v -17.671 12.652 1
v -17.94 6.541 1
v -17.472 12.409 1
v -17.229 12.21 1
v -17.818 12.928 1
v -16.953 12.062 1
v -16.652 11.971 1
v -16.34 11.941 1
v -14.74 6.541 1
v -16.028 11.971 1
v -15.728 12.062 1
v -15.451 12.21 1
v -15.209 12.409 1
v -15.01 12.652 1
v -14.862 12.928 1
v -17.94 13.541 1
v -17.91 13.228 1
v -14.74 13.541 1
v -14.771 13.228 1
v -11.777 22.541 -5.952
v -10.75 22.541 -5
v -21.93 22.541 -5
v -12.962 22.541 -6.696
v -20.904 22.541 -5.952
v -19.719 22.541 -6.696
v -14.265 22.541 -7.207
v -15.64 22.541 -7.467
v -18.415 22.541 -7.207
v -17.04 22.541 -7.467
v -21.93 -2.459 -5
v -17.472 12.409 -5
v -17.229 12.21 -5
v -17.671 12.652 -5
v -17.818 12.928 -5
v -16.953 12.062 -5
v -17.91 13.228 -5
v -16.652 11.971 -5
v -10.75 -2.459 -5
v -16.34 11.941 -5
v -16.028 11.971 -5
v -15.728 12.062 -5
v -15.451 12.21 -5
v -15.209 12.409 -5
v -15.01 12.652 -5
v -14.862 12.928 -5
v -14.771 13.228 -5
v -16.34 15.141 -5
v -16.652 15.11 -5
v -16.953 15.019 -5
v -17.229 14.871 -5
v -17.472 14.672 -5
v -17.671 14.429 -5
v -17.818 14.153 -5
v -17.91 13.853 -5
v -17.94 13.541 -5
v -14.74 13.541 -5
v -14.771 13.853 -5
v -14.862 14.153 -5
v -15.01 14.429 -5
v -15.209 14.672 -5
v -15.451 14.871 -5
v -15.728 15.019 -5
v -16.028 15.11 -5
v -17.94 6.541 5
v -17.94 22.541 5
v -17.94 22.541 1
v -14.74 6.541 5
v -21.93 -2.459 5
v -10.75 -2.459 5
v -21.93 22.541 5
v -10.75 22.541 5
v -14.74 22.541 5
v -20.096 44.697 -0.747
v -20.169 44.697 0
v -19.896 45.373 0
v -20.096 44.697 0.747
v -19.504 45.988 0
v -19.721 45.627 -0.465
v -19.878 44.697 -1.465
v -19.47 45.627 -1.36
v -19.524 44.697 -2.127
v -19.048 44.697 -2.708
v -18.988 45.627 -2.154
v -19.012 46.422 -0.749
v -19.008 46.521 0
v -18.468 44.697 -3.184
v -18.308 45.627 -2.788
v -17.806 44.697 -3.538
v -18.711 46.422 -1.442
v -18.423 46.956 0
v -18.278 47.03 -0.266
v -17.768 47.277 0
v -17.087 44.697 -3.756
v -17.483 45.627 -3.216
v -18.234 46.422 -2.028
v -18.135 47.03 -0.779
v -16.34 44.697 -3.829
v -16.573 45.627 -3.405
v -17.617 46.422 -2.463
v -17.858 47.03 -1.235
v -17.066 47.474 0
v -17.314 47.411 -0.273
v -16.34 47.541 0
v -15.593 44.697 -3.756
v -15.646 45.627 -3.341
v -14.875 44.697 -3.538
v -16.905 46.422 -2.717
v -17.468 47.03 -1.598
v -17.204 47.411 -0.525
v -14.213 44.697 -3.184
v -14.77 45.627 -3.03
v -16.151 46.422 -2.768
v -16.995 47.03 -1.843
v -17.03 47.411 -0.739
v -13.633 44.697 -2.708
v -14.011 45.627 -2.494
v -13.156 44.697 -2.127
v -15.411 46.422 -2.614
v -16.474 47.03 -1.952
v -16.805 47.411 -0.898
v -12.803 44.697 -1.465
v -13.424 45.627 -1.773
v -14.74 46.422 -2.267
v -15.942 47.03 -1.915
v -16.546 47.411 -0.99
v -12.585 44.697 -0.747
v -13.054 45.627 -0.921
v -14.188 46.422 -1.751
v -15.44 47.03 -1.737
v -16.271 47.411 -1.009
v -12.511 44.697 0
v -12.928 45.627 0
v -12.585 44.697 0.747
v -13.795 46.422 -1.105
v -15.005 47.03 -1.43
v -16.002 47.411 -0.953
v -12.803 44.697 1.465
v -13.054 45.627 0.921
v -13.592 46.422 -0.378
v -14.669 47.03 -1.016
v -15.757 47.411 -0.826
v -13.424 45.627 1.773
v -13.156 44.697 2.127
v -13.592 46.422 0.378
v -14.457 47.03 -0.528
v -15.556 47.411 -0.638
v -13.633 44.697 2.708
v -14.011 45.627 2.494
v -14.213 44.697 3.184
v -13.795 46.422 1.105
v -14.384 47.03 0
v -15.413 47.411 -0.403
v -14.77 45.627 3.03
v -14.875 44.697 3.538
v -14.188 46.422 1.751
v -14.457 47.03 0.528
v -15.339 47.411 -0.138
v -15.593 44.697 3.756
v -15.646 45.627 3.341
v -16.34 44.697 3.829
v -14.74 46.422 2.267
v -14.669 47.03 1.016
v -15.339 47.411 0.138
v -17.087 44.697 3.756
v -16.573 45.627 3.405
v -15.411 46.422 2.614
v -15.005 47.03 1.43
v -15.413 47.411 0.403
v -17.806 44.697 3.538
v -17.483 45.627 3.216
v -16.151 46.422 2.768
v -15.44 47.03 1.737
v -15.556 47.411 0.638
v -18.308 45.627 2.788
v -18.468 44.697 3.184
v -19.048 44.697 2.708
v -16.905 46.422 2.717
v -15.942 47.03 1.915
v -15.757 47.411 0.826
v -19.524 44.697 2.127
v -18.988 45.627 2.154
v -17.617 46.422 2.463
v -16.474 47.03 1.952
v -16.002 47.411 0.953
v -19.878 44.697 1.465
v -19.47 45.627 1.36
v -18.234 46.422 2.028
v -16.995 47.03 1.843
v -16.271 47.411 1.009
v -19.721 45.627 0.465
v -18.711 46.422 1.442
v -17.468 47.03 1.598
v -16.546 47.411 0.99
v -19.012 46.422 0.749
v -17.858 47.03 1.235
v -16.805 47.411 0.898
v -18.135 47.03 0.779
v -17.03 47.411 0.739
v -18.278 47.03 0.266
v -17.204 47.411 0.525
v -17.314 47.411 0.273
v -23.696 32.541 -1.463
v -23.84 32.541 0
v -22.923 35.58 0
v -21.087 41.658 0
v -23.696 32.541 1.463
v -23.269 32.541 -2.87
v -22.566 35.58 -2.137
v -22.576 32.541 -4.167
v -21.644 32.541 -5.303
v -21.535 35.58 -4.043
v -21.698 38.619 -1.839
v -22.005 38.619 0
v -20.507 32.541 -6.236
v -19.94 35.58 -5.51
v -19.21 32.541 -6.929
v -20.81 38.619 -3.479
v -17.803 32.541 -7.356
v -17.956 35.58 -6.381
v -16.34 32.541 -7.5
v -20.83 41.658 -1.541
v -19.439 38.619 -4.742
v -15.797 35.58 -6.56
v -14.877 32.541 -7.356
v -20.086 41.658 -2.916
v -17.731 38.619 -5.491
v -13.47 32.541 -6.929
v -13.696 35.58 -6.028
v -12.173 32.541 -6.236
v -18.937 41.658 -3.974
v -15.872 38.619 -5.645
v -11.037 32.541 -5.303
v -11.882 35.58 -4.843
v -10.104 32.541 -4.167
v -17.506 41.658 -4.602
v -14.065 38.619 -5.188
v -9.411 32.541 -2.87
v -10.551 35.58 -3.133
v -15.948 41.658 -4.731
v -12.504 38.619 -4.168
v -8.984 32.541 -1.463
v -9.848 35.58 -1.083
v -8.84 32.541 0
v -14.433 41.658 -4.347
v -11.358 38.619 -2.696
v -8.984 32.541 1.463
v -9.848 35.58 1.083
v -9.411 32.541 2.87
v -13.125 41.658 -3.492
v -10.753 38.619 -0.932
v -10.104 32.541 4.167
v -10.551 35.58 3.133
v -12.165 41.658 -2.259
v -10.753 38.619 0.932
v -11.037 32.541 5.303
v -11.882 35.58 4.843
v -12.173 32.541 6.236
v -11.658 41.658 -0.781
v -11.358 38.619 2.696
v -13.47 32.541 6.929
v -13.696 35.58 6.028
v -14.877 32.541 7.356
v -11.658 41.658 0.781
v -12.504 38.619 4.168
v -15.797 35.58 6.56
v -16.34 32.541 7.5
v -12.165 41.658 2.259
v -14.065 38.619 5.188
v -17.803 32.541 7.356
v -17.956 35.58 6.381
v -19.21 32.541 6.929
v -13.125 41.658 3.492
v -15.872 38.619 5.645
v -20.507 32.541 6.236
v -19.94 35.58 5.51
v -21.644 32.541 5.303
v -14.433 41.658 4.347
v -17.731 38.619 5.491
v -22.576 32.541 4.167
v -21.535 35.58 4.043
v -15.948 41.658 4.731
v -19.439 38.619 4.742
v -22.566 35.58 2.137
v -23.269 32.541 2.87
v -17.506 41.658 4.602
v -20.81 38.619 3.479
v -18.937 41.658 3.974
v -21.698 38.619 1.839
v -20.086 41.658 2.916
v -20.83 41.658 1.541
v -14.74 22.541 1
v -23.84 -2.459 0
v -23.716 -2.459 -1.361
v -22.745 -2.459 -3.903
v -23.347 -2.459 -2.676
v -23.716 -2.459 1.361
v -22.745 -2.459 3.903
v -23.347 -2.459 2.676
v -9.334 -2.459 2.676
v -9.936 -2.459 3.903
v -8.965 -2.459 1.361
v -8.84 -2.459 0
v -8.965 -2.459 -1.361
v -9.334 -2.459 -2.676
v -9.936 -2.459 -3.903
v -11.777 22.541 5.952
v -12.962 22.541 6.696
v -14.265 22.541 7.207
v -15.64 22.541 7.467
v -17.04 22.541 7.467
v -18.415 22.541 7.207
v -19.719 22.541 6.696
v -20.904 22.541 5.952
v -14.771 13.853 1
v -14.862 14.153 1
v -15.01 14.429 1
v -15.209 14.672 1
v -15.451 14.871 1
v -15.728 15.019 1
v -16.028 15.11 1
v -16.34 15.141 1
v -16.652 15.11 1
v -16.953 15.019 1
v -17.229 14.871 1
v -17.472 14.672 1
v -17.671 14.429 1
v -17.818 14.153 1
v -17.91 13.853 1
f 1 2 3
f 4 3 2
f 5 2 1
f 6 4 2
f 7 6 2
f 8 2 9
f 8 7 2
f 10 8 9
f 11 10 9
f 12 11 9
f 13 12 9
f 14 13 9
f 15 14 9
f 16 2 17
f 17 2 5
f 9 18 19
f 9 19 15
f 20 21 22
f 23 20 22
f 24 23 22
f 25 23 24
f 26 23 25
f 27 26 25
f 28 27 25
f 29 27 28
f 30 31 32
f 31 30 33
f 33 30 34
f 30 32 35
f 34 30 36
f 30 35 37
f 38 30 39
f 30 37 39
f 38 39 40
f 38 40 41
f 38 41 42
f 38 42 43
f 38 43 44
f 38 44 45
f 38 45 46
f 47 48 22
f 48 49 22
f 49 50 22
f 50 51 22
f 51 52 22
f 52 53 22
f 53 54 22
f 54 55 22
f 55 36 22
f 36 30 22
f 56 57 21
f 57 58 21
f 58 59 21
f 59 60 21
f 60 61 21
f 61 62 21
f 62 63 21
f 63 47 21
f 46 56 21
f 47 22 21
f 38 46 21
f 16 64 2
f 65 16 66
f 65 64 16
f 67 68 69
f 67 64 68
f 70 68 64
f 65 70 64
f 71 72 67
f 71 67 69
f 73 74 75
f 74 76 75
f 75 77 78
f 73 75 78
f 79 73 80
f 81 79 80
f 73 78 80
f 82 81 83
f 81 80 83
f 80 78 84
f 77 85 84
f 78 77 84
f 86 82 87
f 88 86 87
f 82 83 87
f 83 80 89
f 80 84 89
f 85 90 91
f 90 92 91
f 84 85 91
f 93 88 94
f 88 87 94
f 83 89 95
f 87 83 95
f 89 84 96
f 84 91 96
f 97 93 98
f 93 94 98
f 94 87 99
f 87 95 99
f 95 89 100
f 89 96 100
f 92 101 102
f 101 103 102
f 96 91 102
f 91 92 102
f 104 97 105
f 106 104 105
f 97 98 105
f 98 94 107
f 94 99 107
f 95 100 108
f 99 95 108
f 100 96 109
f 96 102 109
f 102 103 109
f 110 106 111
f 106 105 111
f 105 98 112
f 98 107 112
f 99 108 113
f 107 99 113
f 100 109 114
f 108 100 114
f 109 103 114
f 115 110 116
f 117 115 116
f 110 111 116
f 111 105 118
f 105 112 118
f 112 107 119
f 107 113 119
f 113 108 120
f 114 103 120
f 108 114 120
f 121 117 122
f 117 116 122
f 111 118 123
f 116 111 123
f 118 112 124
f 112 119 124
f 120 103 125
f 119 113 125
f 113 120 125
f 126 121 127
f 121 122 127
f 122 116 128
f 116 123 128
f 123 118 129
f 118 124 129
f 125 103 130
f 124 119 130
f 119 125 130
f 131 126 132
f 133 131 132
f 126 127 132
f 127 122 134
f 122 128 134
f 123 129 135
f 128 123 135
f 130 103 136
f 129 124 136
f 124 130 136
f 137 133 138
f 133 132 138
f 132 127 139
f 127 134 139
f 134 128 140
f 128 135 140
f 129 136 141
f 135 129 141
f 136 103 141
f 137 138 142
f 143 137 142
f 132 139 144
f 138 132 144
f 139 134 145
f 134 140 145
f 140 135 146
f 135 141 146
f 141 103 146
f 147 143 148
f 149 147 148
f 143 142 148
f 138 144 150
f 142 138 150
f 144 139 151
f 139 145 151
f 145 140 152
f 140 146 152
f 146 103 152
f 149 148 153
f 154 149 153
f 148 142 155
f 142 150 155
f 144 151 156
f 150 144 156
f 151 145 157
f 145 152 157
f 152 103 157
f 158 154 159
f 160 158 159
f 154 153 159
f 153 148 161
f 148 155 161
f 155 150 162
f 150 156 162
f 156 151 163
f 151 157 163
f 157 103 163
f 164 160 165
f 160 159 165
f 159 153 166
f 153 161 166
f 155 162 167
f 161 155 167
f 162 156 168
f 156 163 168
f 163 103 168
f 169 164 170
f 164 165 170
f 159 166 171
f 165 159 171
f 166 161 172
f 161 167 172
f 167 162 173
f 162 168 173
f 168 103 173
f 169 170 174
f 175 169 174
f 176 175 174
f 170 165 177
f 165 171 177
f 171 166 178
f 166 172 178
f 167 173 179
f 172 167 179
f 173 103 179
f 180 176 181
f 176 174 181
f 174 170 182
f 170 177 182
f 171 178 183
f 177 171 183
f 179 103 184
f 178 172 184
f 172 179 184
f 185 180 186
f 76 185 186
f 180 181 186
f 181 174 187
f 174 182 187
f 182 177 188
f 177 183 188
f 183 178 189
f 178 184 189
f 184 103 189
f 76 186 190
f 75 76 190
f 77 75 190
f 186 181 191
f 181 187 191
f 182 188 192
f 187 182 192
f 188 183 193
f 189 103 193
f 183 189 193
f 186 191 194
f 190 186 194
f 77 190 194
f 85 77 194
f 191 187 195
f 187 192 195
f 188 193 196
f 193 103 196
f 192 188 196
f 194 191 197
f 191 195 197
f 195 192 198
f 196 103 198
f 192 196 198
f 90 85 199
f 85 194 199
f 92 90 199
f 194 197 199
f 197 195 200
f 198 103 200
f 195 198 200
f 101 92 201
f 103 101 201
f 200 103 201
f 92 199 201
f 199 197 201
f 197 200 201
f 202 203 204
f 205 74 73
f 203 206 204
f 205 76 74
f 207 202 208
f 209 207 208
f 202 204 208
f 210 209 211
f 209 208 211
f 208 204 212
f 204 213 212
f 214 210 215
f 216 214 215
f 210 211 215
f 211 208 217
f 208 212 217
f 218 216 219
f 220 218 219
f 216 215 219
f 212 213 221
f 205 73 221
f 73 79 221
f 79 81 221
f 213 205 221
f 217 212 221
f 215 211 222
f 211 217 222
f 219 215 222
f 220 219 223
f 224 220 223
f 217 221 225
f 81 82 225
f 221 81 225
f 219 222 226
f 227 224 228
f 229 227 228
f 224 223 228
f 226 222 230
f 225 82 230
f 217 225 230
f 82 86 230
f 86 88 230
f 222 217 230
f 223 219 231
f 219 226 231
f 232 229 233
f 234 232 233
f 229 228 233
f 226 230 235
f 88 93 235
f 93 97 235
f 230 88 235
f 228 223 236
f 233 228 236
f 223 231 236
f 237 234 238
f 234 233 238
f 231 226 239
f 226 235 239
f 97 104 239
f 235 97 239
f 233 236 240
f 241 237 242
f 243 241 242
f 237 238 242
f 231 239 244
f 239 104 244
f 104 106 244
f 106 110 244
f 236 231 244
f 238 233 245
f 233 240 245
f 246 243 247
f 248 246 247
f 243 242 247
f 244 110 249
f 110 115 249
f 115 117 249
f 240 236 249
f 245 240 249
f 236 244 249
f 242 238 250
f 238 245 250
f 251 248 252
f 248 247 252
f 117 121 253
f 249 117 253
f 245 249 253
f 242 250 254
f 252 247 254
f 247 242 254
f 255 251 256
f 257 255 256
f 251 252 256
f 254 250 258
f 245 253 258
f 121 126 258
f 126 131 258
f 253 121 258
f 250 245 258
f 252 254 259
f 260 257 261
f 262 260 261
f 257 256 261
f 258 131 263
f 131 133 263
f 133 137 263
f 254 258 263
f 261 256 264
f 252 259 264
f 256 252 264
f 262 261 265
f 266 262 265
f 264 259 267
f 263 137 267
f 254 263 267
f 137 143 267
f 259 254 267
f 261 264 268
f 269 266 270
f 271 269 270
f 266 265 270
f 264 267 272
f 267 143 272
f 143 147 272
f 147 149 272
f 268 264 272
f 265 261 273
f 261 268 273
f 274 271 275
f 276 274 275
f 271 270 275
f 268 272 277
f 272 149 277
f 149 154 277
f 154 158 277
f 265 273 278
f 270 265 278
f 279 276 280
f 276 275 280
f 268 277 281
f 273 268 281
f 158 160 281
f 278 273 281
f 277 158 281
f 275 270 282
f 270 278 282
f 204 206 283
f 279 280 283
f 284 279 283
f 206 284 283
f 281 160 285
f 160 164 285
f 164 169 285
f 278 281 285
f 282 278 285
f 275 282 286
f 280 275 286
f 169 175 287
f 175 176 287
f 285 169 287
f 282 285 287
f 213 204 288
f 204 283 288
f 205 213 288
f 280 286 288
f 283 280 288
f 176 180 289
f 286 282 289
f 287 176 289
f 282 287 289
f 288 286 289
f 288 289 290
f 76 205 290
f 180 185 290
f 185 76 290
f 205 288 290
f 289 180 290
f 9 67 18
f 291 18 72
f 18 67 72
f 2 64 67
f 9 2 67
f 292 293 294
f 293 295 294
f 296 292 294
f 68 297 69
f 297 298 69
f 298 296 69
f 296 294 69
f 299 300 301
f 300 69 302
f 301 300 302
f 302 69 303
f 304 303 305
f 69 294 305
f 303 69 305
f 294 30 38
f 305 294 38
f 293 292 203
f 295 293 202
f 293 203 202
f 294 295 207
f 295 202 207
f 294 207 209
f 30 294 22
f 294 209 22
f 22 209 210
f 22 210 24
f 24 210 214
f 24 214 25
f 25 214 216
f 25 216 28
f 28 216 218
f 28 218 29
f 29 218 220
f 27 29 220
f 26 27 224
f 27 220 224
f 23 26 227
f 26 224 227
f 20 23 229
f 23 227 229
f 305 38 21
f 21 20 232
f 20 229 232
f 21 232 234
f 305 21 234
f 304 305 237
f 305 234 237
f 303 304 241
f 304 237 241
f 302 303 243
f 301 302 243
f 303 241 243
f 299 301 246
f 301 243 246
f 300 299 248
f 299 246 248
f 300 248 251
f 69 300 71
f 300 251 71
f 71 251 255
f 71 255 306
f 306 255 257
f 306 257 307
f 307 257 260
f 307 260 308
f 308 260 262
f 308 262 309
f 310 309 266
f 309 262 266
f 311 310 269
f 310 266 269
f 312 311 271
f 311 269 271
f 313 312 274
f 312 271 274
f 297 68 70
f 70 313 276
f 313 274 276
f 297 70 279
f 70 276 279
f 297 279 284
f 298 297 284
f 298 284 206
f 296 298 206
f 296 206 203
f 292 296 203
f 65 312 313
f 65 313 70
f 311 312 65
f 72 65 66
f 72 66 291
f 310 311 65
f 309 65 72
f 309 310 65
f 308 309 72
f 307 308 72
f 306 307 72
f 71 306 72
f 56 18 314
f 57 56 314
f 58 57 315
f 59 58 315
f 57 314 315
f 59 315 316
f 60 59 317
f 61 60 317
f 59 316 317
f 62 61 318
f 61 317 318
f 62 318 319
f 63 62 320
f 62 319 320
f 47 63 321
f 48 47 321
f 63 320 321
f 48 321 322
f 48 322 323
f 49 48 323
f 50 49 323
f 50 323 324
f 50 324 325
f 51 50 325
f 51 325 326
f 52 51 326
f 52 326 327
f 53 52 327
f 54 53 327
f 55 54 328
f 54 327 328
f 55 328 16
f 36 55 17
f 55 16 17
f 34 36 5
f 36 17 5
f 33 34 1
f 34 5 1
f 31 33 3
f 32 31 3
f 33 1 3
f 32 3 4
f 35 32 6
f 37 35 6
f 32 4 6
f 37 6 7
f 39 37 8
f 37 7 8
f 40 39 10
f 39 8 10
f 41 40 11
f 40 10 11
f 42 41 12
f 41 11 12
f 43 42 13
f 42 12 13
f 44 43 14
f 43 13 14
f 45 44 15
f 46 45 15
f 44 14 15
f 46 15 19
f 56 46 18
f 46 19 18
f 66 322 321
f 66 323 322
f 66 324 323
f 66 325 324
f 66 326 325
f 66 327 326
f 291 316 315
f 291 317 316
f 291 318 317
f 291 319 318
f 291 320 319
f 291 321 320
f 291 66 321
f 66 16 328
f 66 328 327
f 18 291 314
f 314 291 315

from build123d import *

# Parameters (mm, degrees)
CUT_EXTRUDE_START   = -25
CUT_EXTRUDE_1_DEPTH = 25
SKETCH_3_W          = 3.2
SKETCH_3_H          = 16
CUT_EXTRUDE_2_DEPTH = 4
SKETCH_4_R          = 1.6
CUT_EXTRUDE_3_DEPTH = 10


with BuildPart() as part:
    # 草图1 → 旋转1 (revolve)
    with BuildSketch(Plane.XY, mode=Mode.PRIVATE) as revolve_1_sk:
        with BuildLine():
            Line((-16.340250108, 47.540513379), (-16.340250108, -2.459486621))
            Line((-16.340250108, -2.459486621), (-8.840250108, -2.459486621))
            Line((-8.840250108, -2.459486621), (-8.840250108, 32.540513379))
            Line((-8.840250108, 32.540513379), (-12.511021874, 44.696805356))
            ThreePointArc((-12.511021874, 44.696805356), (-13.955419706, 46.751834595), (-16.340250108, 47.540513379))
        make_face()
    revolve(revolve_1_sk.sketch.rotate(Axis((-16.340250108, 47.540513379, 0), (0, -1, 0)), 180), axis=Axis((-16.340250108, 47.540513379, 0), (0, -1, 0)))

    # 草图2 → 切除-拉伸1 (cut)
    with BuildSketch(Plane.XZ.offset(2.459486621).offset(CUT_EXTRUDE_START)):
        with BuildLine():
            Line((-21.930420052, 5), (-10.750080164, 5))
            ThreePointArc((-10.750080164, 5), (-16.340250108, 7.5), (-21.930420052, 5))
        make_face()
        with BuildLine():
            Line((-21.930420052, -5), (-10.750080164, -5))
            ThreePointArc((-10.750080164, -5), (-16.340250108, -7.5), (-21.930420052, -5))
        make_face()
    extrude(amount=CUT_EXTRUDE_1_DEPTH, mode=Mode.SUBTRACT)

    # 草图3 → 切除-拉伸2 (cut)
    with BuildSketch(Plane.XY.offset(5)):
        with Locations((-16.340250108, 14.540513379)):
            Rectangle(SKETCH_3_W, SKETCH_3_H)
    extrude(amount=-CUT_EXTRUDE_2_DEPTH, mode=Mode.SUBTRACT)

    # 草图4 → 切除-拉伸3 (cut)
    with BuildSketch(Plane.XY.offset(1)):
        with Locations((-16.340250108, 13.540513379)):
            Circle(SKETCH_4_R)
    extrude(amount=-CUT_EXTRUDE_3_DEPTH, mode=Mode.SUBTRACT)


solid = part.part
